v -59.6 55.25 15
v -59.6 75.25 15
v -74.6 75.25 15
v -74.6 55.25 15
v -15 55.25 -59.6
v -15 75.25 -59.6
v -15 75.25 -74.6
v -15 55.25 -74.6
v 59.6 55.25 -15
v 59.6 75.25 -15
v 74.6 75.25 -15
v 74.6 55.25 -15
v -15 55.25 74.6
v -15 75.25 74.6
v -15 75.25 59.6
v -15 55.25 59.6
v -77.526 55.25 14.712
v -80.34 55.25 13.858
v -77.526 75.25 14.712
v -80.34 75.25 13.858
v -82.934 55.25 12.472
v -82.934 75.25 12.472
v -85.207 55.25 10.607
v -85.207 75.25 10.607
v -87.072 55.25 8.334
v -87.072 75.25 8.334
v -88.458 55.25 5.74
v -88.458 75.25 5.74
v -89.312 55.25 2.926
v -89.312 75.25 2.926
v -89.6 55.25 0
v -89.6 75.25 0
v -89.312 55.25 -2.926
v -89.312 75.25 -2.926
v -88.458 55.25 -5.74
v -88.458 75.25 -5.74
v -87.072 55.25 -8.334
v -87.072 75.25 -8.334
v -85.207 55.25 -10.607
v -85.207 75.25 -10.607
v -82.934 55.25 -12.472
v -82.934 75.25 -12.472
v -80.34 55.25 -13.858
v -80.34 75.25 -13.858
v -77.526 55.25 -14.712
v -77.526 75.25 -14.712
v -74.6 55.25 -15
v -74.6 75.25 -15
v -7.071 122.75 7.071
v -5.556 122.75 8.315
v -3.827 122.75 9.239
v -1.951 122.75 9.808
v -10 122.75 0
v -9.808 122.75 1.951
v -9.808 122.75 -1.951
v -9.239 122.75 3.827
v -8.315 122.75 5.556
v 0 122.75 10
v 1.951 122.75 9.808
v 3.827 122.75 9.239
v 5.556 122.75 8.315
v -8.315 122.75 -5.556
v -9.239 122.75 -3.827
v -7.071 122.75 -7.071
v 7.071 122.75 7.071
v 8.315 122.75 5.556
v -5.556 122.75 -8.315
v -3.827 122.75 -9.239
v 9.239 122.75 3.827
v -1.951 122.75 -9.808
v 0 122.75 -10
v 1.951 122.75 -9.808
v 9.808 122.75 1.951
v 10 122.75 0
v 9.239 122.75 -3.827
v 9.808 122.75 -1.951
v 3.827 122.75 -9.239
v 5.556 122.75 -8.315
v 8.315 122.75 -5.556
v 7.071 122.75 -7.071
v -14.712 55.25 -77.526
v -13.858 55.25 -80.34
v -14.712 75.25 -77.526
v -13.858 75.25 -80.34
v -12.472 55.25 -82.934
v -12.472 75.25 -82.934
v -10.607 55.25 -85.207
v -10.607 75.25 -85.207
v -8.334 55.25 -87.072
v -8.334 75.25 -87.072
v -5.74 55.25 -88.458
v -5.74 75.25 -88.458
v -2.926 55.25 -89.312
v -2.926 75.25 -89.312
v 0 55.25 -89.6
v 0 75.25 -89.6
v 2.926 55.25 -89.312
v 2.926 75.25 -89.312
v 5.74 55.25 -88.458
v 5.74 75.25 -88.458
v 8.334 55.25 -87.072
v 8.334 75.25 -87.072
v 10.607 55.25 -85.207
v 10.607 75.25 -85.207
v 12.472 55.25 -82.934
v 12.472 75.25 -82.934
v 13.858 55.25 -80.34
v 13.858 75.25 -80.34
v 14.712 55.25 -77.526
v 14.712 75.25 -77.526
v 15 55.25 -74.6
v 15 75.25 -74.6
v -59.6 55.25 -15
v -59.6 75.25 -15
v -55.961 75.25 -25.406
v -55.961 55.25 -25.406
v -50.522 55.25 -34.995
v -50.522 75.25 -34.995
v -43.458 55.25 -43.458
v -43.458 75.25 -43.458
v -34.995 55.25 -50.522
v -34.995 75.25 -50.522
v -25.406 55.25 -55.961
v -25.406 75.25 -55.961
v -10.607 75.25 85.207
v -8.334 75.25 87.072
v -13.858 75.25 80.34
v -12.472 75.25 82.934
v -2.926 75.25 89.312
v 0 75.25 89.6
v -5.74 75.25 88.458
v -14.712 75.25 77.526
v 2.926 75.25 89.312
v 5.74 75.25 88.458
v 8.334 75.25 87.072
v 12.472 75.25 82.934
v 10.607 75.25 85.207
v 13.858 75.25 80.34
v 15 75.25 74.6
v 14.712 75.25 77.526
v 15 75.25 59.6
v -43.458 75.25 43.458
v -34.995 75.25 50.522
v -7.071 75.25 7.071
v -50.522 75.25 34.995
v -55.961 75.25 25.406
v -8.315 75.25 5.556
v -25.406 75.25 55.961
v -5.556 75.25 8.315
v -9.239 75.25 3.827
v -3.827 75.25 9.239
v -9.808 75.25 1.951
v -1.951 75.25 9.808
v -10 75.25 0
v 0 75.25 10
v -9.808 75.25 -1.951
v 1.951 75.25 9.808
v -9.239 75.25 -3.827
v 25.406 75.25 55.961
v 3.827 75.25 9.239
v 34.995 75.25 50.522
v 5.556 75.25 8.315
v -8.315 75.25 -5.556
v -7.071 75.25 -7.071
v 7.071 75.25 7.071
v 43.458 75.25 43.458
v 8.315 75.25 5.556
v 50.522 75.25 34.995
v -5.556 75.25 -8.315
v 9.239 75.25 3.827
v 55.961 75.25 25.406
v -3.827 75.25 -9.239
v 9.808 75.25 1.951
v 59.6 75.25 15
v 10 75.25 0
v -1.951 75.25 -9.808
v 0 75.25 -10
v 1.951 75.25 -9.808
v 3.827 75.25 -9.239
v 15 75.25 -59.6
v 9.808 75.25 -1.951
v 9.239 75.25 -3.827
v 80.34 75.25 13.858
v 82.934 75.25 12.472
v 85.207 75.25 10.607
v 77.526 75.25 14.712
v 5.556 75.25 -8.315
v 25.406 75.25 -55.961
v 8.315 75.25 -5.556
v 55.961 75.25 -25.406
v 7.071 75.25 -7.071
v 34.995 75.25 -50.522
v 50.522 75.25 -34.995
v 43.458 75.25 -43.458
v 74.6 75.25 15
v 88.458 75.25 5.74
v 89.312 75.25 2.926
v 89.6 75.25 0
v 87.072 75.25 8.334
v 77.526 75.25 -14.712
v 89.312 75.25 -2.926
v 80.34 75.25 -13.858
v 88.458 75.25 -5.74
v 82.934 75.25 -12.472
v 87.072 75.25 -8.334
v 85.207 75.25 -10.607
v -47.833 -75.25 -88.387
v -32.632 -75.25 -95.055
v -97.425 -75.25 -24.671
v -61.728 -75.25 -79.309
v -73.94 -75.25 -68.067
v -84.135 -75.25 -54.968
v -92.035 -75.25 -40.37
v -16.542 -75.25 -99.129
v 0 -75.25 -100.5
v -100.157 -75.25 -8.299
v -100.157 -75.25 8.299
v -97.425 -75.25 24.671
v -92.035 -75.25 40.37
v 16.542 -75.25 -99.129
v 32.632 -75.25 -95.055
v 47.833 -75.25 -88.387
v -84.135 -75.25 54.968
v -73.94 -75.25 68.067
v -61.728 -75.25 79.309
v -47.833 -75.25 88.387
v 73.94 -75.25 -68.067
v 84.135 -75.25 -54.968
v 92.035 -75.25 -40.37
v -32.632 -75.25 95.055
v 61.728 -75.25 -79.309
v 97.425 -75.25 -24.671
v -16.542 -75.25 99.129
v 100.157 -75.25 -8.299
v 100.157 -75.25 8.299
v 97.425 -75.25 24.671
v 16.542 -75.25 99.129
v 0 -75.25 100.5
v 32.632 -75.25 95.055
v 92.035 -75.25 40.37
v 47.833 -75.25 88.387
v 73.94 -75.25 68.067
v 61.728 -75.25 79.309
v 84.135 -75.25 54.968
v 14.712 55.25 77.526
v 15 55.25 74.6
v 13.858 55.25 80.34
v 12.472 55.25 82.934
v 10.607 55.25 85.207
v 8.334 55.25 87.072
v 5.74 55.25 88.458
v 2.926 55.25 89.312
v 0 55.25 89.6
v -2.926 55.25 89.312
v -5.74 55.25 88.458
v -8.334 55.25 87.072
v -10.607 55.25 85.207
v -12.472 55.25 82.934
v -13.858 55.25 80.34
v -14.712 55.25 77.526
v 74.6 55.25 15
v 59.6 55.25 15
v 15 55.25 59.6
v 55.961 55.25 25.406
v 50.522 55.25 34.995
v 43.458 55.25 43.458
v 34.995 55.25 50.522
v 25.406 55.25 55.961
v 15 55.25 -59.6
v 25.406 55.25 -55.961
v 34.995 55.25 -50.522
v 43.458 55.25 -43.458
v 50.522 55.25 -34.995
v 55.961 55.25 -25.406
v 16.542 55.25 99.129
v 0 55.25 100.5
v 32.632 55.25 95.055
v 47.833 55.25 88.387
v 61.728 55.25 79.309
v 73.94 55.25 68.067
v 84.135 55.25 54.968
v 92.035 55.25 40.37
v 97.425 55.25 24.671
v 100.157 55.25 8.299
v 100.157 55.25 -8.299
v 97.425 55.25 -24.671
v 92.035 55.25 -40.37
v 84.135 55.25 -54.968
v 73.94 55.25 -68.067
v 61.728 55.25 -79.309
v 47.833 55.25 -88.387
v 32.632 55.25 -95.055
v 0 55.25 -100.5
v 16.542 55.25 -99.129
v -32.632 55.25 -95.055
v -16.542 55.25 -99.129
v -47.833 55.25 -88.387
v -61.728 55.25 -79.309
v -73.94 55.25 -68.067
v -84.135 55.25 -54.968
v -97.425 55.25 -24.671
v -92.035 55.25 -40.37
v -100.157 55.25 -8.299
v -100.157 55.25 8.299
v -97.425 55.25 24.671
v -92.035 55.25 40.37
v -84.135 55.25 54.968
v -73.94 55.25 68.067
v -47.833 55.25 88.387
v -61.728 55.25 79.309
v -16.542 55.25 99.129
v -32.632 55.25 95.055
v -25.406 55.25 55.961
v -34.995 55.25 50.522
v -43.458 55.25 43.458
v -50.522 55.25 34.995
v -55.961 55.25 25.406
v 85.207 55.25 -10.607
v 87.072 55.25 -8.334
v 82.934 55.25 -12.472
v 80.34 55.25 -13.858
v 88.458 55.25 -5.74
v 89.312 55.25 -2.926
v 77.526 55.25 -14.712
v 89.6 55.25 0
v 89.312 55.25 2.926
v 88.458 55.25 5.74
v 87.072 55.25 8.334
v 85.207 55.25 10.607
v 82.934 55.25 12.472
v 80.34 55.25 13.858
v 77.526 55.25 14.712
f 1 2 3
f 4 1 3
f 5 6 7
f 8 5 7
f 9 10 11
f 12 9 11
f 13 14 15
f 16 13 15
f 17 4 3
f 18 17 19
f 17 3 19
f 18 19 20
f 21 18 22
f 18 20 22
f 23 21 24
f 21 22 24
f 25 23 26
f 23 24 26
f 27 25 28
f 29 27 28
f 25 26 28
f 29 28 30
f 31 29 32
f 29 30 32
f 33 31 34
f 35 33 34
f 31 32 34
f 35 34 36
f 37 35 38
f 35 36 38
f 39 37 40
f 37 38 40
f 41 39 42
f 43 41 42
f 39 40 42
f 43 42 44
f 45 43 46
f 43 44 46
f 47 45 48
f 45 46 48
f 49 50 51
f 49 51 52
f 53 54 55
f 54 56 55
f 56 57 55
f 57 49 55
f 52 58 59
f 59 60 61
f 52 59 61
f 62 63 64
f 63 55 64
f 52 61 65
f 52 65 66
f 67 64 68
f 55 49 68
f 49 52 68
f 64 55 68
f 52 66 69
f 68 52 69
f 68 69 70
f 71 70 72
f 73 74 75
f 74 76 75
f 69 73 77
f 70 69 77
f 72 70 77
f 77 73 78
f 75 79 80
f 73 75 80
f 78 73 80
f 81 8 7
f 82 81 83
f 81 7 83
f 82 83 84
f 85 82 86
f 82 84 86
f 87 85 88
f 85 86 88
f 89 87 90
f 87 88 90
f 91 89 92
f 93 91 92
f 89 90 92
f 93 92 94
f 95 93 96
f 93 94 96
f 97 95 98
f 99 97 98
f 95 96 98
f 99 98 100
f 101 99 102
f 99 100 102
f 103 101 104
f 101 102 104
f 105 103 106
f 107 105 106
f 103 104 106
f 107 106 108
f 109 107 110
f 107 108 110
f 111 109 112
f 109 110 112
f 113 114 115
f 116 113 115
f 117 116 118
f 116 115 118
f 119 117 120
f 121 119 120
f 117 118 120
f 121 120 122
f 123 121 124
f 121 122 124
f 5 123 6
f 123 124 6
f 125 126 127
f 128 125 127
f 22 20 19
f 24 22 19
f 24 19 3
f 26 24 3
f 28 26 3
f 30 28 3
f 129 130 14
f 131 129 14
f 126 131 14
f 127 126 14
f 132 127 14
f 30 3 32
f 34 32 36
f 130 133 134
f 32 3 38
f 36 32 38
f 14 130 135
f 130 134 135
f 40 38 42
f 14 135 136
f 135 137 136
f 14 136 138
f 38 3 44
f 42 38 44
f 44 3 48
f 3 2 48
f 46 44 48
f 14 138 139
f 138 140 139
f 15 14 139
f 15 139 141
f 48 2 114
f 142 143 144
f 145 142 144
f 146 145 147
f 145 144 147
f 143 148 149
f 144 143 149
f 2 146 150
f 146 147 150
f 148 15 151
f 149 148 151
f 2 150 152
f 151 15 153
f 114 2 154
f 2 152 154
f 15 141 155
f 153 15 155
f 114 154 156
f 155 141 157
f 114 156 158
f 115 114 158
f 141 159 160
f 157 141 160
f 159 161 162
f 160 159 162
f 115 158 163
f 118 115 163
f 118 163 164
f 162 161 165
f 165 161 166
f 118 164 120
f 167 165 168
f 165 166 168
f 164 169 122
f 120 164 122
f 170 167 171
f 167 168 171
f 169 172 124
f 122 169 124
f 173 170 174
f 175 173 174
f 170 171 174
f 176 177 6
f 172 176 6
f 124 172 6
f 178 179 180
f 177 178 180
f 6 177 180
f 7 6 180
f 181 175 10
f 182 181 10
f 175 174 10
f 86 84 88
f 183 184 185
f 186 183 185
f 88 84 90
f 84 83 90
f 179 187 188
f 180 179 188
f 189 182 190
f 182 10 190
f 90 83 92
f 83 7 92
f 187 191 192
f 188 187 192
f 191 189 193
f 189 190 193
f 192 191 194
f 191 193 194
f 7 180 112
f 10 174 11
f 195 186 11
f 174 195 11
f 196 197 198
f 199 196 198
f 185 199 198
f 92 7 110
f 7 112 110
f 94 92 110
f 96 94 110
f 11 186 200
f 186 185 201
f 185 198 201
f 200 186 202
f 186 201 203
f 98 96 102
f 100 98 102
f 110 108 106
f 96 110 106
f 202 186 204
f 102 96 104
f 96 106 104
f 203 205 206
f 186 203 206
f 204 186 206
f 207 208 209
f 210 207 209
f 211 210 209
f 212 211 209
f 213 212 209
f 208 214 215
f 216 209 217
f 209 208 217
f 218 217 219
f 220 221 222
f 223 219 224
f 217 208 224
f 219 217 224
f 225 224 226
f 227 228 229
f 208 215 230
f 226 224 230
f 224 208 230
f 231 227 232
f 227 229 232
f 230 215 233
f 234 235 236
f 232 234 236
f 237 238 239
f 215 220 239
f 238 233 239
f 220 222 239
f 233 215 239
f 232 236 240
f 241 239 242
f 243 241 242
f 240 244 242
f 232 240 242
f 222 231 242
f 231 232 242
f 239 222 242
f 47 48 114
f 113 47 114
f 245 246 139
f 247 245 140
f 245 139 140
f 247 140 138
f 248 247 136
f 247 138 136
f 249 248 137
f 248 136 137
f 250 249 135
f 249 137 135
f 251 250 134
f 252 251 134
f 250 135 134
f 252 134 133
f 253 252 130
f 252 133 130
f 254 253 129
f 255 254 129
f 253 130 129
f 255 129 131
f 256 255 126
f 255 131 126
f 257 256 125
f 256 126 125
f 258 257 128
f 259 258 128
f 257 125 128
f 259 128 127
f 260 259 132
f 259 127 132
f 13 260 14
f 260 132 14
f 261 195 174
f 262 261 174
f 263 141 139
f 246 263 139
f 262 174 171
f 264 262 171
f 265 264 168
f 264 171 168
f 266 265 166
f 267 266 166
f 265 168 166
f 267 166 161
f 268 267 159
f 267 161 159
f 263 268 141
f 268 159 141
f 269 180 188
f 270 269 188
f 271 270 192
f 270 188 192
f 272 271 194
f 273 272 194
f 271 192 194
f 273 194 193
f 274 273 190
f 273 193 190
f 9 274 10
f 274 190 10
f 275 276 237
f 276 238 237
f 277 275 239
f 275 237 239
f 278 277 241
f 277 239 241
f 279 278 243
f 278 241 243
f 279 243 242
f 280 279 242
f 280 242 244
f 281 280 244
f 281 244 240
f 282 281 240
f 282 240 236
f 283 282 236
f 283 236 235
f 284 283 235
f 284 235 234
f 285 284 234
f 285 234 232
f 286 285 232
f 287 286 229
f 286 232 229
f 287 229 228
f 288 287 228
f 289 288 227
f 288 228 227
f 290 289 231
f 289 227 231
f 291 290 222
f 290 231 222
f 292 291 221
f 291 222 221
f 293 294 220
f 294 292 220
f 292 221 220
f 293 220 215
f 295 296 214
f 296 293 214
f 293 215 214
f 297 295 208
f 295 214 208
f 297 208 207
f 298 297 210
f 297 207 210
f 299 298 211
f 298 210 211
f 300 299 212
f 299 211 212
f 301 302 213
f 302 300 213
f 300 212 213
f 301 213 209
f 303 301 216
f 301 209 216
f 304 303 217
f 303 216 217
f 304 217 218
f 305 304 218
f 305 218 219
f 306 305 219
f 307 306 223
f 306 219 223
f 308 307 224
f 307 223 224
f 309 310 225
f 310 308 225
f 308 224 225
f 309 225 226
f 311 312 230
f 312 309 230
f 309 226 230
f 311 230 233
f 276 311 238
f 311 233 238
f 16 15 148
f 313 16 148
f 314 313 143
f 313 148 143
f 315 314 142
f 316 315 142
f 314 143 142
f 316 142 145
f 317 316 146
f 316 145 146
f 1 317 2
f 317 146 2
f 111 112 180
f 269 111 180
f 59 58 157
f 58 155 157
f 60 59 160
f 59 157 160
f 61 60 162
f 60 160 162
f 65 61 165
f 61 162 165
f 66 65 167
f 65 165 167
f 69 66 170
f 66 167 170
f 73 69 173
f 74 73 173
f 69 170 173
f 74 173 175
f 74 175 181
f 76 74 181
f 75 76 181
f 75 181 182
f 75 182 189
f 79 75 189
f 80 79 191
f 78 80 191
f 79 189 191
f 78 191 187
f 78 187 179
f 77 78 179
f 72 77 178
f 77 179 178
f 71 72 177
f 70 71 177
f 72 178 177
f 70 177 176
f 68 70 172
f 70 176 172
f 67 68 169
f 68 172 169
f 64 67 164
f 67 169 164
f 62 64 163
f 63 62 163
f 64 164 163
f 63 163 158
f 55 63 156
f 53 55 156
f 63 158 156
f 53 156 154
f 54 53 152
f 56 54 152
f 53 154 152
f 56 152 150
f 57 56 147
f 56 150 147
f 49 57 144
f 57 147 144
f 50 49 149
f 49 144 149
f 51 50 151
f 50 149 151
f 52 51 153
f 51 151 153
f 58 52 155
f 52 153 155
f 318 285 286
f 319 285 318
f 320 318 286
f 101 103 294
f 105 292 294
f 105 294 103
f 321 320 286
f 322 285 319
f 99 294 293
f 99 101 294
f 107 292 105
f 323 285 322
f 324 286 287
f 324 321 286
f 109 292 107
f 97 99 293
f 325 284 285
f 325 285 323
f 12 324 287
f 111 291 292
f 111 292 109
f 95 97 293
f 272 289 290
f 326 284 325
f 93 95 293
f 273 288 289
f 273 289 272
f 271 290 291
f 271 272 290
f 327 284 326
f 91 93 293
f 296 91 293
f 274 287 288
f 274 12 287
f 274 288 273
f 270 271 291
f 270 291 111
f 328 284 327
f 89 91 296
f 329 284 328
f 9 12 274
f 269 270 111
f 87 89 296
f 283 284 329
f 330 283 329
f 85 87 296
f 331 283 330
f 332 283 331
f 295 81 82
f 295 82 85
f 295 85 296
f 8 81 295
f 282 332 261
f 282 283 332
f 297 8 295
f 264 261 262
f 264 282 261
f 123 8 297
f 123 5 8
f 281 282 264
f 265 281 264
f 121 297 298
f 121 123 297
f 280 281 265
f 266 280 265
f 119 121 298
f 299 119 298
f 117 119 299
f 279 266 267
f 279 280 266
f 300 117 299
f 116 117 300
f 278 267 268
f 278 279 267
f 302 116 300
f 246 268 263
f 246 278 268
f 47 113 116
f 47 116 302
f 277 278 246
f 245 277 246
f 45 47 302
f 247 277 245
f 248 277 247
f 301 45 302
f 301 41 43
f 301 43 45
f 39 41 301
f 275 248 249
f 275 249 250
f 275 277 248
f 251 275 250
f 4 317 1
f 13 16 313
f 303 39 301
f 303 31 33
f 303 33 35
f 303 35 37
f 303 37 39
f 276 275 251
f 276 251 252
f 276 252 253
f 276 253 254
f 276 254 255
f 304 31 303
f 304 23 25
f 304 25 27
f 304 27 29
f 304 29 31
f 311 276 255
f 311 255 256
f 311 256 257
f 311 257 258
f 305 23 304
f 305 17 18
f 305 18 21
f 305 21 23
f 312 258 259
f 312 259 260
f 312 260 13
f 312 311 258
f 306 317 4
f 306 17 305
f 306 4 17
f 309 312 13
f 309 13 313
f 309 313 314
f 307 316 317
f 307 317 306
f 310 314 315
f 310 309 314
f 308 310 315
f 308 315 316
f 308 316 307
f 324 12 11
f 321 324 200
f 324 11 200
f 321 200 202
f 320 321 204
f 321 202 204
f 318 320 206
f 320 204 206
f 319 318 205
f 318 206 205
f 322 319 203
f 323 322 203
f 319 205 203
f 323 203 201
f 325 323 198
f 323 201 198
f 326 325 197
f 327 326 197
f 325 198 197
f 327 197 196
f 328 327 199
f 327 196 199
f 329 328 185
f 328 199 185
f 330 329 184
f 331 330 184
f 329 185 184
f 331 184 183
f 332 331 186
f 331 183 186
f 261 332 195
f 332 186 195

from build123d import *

# Parameters (mm, degrees)
F2_R     = 115
F3_DEPTH = 20


with BuildPart() as f1:
    # F0 (on Right) → F1 (revolve)
    with BuildSketch(Plane.YZ):
        Polygon((-75.25, 100.5), (-75.25, 0), (122.75, 0), (122.75, 10), (75.25, 10), (75.25, 100.5), align=None)
    revolve(axis=Axis((0, 23.75, 0), (0, 1, 0)))

    # F2 (on face) → F3 (cut)
    with BuildSketch(Plane(origin=(0, 75.25, 0), x_dir=(-1, 0, 0), z_dir=(0, 1, 0))):
        Circle(F2_R)
        with BuildLine():
            ThreePointArc((-15, 74.6), (0, 89.6), (15, 74.6))
            Line((15, 74.6), (15, 59.6))
            ThreePointArc((15, 59.6), (43.457796, 43.457796), (59.6, 15))
            Line((59.6, 15), (74.6, 15))
            ThreePointArc((74.6, 15), (89.6, 0), (74.6, -15))
            Line((74.6, -15), (59.6, -15))
            ThreePointArc((59.6, -15), (43.457796, -43.457796), (15, -59.6))
            Line((15, -59.6), (15, -74.6))
            ThreePointArc((15, -74.6), (0, -89.6), (-15, -74.6))
            Line((-15, -74.6), (-15, -59.6))
            ThreePointArc((-15, -59.6), (-43.457796, -43.457796), (-59.6, -15))
            Line((-59.6, -15), (-74.6, -15))
            ThreePointArc((-74.6, -15), (-89.6, 0), (-74.6, 15))
            Line((-74.6, 15), (-59.6, 15))
            ThreePointArc((-59.6, 15), (-43.457796, 43.457796), (-15, 59.6))
            Line((-15, 59.6), (-15, 74.6))
        make_face(mode=Mode.SUBTRACT)
    extrude(amount=-F3_DEPTH, mode=Mode.SUBTRACT)


solid = f1.part
